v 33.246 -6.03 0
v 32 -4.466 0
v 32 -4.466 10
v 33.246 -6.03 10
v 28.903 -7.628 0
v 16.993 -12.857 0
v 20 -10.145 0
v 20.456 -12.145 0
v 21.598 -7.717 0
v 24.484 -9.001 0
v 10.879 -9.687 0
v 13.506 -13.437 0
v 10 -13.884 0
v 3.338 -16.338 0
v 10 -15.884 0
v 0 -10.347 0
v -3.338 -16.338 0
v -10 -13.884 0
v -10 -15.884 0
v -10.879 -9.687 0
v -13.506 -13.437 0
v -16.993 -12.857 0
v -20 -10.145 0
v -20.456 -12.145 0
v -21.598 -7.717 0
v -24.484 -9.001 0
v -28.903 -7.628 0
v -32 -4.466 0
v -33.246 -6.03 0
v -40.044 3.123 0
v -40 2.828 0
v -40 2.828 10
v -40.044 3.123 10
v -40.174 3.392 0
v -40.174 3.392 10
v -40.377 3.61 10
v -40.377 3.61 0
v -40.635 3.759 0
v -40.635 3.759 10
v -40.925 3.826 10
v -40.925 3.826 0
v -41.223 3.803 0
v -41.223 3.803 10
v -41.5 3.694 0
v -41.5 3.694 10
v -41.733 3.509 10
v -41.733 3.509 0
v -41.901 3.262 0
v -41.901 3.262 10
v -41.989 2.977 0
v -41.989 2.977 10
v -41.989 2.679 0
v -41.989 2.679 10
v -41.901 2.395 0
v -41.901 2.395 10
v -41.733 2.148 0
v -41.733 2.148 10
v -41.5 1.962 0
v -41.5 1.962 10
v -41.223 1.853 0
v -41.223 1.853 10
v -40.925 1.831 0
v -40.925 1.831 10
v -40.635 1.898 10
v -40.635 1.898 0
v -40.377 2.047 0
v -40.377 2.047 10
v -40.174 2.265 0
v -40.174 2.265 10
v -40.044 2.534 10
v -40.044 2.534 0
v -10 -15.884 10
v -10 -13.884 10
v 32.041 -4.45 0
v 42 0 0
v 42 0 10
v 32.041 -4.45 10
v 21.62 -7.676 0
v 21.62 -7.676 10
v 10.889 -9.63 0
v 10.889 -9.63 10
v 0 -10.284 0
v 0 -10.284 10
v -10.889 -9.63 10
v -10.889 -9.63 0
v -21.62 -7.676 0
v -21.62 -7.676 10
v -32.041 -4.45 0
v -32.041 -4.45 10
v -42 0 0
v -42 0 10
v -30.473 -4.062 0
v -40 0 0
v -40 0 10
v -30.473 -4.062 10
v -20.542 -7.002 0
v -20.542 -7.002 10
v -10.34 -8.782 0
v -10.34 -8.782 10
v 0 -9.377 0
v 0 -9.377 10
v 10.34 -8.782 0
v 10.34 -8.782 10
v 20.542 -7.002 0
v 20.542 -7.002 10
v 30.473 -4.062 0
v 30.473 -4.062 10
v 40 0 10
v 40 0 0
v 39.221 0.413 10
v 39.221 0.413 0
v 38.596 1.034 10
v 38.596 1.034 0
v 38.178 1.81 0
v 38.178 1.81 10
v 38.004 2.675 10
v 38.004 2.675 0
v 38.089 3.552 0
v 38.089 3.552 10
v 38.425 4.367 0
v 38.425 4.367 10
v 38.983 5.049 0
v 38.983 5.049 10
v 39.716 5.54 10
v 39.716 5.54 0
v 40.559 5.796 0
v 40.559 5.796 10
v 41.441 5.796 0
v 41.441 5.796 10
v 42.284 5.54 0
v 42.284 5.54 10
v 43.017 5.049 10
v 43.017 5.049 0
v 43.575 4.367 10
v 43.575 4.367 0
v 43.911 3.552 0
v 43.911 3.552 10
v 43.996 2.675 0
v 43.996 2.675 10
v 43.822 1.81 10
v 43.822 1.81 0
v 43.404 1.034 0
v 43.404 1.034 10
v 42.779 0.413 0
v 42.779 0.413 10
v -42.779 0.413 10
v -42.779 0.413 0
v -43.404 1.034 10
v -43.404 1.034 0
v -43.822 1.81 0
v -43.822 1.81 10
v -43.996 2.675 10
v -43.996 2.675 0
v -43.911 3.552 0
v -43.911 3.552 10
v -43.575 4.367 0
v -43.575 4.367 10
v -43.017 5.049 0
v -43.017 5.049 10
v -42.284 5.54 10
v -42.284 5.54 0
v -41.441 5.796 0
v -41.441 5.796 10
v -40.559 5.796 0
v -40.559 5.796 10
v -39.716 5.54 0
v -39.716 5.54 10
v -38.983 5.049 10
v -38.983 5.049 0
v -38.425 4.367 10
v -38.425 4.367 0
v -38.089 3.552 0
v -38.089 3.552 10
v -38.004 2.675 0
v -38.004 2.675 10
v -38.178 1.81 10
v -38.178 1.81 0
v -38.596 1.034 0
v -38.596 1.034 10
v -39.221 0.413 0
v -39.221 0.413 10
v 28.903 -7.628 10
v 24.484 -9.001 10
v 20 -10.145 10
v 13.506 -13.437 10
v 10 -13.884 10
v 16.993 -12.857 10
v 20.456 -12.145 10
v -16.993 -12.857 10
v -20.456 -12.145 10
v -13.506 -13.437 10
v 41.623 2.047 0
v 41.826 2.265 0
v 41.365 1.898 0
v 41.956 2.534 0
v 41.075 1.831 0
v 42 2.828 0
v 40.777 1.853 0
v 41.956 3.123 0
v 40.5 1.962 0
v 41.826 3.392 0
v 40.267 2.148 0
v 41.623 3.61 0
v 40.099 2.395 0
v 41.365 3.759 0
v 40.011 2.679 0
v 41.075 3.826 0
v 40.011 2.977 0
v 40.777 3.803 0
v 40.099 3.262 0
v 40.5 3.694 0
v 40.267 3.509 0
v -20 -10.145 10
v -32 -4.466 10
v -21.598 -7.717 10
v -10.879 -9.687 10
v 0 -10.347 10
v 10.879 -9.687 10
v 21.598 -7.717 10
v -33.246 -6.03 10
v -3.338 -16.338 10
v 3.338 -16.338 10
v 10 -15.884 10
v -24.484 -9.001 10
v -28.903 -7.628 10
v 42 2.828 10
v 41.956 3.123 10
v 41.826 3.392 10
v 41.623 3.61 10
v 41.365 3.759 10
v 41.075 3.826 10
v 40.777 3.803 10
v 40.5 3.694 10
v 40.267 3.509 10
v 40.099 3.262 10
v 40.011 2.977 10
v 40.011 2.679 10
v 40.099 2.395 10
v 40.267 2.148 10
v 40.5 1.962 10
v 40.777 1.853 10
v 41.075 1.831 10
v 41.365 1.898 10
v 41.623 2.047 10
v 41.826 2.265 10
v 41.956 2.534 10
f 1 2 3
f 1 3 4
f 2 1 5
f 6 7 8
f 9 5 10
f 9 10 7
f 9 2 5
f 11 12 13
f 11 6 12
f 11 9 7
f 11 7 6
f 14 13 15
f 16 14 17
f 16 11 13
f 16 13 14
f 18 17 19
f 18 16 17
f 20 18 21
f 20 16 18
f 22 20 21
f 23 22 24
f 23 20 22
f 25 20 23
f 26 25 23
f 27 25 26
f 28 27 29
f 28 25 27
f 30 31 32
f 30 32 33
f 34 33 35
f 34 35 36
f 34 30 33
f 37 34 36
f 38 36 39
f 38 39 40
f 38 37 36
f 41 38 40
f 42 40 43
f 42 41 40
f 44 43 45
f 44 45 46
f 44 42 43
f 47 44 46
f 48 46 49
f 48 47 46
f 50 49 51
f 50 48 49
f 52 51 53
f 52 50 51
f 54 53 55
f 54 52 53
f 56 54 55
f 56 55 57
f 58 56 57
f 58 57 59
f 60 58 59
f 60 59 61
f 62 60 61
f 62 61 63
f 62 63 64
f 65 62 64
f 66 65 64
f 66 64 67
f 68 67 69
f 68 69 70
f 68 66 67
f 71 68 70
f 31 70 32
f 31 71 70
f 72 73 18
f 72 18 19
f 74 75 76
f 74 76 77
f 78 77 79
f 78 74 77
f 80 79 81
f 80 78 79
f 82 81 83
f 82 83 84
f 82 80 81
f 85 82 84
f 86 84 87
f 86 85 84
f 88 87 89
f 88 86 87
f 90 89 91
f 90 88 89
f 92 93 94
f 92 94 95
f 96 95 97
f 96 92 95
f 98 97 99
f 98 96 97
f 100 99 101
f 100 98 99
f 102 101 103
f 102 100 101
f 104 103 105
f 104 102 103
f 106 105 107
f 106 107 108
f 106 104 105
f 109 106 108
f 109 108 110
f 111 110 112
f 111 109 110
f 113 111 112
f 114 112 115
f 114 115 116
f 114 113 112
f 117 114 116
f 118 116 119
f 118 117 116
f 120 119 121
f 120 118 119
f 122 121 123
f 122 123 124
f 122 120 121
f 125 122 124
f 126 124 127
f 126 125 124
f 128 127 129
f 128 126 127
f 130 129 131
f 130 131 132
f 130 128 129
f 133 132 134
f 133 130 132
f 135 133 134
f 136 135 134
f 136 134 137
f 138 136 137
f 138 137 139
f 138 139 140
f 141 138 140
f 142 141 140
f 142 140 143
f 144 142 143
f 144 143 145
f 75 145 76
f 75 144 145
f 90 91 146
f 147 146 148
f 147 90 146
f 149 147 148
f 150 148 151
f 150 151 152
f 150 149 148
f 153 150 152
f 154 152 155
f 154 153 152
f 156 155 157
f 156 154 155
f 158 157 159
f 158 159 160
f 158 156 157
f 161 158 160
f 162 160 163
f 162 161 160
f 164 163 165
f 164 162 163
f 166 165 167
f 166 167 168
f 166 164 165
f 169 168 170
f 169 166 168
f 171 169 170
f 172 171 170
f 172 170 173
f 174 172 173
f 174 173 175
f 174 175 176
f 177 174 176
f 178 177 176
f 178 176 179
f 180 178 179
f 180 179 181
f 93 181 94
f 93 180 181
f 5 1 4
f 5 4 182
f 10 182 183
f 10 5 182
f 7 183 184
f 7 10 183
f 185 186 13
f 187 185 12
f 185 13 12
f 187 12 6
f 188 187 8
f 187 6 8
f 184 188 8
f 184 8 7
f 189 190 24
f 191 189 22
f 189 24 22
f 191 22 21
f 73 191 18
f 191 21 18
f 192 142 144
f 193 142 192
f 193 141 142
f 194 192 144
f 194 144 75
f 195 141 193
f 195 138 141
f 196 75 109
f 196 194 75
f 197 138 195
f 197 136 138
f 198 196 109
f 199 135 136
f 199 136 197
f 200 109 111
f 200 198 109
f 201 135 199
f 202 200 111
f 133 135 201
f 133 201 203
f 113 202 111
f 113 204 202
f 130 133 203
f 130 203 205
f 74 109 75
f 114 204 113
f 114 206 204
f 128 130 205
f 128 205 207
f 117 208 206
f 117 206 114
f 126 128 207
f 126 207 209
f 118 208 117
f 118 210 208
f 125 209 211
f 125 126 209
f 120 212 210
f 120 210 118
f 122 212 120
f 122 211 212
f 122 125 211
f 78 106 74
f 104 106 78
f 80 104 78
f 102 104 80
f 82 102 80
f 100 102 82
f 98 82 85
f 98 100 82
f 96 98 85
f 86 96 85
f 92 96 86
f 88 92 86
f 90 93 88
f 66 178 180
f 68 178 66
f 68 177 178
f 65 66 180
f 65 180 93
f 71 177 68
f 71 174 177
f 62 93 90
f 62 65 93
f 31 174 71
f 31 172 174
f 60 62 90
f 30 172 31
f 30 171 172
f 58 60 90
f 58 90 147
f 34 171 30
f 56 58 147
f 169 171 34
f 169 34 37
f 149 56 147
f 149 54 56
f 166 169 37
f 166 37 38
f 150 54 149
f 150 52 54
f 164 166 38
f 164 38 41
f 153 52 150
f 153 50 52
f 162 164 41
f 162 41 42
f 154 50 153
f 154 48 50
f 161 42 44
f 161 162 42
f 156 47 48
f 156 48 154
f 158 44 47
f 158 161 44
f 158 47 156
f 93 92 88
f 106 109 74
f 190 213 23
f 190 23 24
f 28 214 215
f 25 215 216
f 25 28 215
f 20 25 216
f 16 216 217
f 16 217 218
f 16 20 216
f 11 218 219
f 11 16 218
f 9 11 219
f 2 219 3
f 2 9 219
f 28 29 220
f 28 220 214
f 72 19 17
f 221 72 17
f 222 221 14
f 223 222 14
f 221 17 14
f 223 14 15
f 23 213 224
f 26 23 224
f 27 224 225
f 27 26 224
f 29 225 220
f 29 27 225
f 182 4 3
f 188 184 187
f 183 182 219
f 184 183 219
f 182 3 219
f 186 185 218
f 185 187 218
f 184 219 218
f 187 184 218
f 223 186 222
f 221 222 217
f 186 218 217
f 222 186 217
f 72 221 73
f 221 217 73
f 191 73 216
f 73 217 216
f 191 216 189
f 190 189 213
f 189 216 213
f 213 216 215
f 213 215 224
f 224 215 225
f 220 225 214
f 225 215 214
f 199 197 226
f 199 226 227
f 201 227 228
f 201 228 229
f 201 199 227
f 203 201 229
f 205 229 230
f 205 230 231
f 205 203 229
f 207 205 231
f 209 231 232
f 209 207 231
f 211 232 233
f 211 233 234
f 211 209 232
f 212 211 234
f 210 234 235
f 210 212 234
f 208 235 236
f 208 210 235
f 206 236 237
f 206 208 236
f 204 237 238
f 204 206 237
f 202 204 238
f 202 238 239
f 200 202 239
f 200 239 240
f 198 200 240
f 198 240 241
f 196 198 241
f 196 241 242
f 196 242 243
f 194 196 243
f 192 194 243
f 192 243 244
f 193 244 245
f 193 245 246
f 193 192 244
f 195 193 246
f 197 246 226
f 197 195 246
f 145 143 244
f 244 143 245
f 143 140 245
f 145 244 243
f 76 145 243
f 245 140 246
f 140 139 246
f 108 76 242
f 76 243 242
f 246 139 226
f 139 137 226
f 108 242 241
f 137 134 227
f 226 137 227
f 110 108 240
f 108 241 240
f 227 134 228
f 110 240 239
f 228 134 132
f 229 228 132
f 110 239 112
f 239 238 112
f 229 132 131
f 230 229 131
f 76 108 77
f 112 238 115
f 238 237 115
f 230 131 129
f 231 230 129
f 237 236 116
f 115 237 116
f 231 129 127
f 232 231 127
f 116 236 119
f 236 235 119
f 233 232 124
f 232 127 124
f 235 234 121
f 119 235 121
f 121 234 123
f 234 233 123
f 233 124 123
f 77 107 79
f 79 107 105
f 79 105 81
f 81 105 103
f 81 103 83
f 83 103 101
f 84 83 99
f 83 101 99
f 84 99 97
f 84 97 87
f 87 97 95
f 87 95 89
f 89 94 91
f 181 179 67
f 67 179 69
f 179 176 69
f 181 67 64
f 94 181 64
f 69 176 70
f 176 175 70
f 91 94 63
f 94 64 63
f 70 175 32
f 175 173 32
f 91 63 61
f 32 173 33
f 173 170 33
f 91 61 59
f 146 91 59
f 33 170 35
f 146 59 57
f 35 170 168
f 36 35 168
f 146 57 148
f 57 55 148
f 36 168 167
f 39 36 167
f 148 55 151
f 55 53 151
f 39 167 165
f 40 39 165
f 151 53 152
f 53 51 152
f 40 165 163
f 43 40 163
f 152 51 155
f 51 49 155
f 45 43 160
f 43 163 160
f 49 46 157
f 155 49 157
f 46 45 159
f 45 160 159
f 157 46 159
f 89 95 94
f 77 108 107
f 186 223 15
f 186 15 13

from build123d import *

# Parameters (mm, degrees)
SKETCH1_R            = 1
BOSS_EXTRUDE1_DEPTH  = 10
BOSS_EXTRUDE3_DEPTH  = 10
BOSS_EXTRUDE5_DEPTH  = 10
BOSS_EXTRUDE12_DEPTH = 10


with BuildPart() as part:
    # Sketch1 → Boss-Extrude1 (new body)
    with BuildSketch(Plane.XY):
        with BuildLine():
            ThreePointArc((-40, 0), (0, -9.377422517), (40, 0))
            ThreePointArc((40, 0), (41, 5.828427125), (42, 0))
            ThreePointArc((42, 0), (0, -10.283967936), (-42, 0))
            ThreePointArc((-42, 0), (-41, 5.828427125), (-40, 0))
        make_face()
        with Locations((-41, 2.828427125)):
            Circle(SKETCH1_R, mode=Mode.SUBTRACT)
        with Locations((41, 2.828427125)):
            Circle(SKETCH1_R, mode=Mode.SUBTRACT)
    extrude(amount=BOSS_EXTRUDE1_DEPTH)


with BuildPart() as body_2:
    # Sketch2 → Boss-Extrude3 (new body)
    with BuildSketch(Plane.XY):
        with BuildLine():
            Line((-33.245929305, -6.030112035), (-32, -4.465612062))
            ThreePointArc((-32, -4.465612062), (0, -10.346648682), (32, -4.465612062))
            Line((32, -4.465612062), (33.245929305, -6.030112035))
            ThreePointArc((33.245929305, -6.030112035), (0, -12.395740006), (-33.245929305, -6.030112035))
        make_face()
    extrude(amount=BOSS_EXTRUDE3_DEPTH)

    # Sketch3 → Boss-Extrude5 (add)
    with BuildSketch(Plane.XY):
        with BuildLine():
            Line((-20, -10.14538388), (-20.455842306, -12.14538388))
            ThreePointArc((-20.455842306, -12.14538388), (0, -14.422958232), (20.455842306, -12.14538388))
            Line((20.455842306, -12.14538388), (20, -10.14538388))
            ThreePointArc((20, -10.14538388), (0, -12.395740006), (-20, -10.14538388))
        make_face()
    extrude(amount=BOSS_EXTRUDE5_DEPTH)

    # Sketch4 → Boss-Extrude12 (add, through all)
    with BuildSketch(Plane.XY):
        with BuildLine():
            Line((-10, -13.883760737), (-10, -15.883760737))
            ThreePointArc((-10, -15.883760737), (0, -16.395299882), (10, -15.883760737))
            Line((10, -15.883760737), (10, -13.883760737))
            ThreePointArc((10, -13.883760737), (0, -14.422958232), (-10, -13.883760737))
        make_face()
    extrude(amount=BOSS_EXTRUDE12_DEPTH)


solid = Compound([part.part, body_2.part])
